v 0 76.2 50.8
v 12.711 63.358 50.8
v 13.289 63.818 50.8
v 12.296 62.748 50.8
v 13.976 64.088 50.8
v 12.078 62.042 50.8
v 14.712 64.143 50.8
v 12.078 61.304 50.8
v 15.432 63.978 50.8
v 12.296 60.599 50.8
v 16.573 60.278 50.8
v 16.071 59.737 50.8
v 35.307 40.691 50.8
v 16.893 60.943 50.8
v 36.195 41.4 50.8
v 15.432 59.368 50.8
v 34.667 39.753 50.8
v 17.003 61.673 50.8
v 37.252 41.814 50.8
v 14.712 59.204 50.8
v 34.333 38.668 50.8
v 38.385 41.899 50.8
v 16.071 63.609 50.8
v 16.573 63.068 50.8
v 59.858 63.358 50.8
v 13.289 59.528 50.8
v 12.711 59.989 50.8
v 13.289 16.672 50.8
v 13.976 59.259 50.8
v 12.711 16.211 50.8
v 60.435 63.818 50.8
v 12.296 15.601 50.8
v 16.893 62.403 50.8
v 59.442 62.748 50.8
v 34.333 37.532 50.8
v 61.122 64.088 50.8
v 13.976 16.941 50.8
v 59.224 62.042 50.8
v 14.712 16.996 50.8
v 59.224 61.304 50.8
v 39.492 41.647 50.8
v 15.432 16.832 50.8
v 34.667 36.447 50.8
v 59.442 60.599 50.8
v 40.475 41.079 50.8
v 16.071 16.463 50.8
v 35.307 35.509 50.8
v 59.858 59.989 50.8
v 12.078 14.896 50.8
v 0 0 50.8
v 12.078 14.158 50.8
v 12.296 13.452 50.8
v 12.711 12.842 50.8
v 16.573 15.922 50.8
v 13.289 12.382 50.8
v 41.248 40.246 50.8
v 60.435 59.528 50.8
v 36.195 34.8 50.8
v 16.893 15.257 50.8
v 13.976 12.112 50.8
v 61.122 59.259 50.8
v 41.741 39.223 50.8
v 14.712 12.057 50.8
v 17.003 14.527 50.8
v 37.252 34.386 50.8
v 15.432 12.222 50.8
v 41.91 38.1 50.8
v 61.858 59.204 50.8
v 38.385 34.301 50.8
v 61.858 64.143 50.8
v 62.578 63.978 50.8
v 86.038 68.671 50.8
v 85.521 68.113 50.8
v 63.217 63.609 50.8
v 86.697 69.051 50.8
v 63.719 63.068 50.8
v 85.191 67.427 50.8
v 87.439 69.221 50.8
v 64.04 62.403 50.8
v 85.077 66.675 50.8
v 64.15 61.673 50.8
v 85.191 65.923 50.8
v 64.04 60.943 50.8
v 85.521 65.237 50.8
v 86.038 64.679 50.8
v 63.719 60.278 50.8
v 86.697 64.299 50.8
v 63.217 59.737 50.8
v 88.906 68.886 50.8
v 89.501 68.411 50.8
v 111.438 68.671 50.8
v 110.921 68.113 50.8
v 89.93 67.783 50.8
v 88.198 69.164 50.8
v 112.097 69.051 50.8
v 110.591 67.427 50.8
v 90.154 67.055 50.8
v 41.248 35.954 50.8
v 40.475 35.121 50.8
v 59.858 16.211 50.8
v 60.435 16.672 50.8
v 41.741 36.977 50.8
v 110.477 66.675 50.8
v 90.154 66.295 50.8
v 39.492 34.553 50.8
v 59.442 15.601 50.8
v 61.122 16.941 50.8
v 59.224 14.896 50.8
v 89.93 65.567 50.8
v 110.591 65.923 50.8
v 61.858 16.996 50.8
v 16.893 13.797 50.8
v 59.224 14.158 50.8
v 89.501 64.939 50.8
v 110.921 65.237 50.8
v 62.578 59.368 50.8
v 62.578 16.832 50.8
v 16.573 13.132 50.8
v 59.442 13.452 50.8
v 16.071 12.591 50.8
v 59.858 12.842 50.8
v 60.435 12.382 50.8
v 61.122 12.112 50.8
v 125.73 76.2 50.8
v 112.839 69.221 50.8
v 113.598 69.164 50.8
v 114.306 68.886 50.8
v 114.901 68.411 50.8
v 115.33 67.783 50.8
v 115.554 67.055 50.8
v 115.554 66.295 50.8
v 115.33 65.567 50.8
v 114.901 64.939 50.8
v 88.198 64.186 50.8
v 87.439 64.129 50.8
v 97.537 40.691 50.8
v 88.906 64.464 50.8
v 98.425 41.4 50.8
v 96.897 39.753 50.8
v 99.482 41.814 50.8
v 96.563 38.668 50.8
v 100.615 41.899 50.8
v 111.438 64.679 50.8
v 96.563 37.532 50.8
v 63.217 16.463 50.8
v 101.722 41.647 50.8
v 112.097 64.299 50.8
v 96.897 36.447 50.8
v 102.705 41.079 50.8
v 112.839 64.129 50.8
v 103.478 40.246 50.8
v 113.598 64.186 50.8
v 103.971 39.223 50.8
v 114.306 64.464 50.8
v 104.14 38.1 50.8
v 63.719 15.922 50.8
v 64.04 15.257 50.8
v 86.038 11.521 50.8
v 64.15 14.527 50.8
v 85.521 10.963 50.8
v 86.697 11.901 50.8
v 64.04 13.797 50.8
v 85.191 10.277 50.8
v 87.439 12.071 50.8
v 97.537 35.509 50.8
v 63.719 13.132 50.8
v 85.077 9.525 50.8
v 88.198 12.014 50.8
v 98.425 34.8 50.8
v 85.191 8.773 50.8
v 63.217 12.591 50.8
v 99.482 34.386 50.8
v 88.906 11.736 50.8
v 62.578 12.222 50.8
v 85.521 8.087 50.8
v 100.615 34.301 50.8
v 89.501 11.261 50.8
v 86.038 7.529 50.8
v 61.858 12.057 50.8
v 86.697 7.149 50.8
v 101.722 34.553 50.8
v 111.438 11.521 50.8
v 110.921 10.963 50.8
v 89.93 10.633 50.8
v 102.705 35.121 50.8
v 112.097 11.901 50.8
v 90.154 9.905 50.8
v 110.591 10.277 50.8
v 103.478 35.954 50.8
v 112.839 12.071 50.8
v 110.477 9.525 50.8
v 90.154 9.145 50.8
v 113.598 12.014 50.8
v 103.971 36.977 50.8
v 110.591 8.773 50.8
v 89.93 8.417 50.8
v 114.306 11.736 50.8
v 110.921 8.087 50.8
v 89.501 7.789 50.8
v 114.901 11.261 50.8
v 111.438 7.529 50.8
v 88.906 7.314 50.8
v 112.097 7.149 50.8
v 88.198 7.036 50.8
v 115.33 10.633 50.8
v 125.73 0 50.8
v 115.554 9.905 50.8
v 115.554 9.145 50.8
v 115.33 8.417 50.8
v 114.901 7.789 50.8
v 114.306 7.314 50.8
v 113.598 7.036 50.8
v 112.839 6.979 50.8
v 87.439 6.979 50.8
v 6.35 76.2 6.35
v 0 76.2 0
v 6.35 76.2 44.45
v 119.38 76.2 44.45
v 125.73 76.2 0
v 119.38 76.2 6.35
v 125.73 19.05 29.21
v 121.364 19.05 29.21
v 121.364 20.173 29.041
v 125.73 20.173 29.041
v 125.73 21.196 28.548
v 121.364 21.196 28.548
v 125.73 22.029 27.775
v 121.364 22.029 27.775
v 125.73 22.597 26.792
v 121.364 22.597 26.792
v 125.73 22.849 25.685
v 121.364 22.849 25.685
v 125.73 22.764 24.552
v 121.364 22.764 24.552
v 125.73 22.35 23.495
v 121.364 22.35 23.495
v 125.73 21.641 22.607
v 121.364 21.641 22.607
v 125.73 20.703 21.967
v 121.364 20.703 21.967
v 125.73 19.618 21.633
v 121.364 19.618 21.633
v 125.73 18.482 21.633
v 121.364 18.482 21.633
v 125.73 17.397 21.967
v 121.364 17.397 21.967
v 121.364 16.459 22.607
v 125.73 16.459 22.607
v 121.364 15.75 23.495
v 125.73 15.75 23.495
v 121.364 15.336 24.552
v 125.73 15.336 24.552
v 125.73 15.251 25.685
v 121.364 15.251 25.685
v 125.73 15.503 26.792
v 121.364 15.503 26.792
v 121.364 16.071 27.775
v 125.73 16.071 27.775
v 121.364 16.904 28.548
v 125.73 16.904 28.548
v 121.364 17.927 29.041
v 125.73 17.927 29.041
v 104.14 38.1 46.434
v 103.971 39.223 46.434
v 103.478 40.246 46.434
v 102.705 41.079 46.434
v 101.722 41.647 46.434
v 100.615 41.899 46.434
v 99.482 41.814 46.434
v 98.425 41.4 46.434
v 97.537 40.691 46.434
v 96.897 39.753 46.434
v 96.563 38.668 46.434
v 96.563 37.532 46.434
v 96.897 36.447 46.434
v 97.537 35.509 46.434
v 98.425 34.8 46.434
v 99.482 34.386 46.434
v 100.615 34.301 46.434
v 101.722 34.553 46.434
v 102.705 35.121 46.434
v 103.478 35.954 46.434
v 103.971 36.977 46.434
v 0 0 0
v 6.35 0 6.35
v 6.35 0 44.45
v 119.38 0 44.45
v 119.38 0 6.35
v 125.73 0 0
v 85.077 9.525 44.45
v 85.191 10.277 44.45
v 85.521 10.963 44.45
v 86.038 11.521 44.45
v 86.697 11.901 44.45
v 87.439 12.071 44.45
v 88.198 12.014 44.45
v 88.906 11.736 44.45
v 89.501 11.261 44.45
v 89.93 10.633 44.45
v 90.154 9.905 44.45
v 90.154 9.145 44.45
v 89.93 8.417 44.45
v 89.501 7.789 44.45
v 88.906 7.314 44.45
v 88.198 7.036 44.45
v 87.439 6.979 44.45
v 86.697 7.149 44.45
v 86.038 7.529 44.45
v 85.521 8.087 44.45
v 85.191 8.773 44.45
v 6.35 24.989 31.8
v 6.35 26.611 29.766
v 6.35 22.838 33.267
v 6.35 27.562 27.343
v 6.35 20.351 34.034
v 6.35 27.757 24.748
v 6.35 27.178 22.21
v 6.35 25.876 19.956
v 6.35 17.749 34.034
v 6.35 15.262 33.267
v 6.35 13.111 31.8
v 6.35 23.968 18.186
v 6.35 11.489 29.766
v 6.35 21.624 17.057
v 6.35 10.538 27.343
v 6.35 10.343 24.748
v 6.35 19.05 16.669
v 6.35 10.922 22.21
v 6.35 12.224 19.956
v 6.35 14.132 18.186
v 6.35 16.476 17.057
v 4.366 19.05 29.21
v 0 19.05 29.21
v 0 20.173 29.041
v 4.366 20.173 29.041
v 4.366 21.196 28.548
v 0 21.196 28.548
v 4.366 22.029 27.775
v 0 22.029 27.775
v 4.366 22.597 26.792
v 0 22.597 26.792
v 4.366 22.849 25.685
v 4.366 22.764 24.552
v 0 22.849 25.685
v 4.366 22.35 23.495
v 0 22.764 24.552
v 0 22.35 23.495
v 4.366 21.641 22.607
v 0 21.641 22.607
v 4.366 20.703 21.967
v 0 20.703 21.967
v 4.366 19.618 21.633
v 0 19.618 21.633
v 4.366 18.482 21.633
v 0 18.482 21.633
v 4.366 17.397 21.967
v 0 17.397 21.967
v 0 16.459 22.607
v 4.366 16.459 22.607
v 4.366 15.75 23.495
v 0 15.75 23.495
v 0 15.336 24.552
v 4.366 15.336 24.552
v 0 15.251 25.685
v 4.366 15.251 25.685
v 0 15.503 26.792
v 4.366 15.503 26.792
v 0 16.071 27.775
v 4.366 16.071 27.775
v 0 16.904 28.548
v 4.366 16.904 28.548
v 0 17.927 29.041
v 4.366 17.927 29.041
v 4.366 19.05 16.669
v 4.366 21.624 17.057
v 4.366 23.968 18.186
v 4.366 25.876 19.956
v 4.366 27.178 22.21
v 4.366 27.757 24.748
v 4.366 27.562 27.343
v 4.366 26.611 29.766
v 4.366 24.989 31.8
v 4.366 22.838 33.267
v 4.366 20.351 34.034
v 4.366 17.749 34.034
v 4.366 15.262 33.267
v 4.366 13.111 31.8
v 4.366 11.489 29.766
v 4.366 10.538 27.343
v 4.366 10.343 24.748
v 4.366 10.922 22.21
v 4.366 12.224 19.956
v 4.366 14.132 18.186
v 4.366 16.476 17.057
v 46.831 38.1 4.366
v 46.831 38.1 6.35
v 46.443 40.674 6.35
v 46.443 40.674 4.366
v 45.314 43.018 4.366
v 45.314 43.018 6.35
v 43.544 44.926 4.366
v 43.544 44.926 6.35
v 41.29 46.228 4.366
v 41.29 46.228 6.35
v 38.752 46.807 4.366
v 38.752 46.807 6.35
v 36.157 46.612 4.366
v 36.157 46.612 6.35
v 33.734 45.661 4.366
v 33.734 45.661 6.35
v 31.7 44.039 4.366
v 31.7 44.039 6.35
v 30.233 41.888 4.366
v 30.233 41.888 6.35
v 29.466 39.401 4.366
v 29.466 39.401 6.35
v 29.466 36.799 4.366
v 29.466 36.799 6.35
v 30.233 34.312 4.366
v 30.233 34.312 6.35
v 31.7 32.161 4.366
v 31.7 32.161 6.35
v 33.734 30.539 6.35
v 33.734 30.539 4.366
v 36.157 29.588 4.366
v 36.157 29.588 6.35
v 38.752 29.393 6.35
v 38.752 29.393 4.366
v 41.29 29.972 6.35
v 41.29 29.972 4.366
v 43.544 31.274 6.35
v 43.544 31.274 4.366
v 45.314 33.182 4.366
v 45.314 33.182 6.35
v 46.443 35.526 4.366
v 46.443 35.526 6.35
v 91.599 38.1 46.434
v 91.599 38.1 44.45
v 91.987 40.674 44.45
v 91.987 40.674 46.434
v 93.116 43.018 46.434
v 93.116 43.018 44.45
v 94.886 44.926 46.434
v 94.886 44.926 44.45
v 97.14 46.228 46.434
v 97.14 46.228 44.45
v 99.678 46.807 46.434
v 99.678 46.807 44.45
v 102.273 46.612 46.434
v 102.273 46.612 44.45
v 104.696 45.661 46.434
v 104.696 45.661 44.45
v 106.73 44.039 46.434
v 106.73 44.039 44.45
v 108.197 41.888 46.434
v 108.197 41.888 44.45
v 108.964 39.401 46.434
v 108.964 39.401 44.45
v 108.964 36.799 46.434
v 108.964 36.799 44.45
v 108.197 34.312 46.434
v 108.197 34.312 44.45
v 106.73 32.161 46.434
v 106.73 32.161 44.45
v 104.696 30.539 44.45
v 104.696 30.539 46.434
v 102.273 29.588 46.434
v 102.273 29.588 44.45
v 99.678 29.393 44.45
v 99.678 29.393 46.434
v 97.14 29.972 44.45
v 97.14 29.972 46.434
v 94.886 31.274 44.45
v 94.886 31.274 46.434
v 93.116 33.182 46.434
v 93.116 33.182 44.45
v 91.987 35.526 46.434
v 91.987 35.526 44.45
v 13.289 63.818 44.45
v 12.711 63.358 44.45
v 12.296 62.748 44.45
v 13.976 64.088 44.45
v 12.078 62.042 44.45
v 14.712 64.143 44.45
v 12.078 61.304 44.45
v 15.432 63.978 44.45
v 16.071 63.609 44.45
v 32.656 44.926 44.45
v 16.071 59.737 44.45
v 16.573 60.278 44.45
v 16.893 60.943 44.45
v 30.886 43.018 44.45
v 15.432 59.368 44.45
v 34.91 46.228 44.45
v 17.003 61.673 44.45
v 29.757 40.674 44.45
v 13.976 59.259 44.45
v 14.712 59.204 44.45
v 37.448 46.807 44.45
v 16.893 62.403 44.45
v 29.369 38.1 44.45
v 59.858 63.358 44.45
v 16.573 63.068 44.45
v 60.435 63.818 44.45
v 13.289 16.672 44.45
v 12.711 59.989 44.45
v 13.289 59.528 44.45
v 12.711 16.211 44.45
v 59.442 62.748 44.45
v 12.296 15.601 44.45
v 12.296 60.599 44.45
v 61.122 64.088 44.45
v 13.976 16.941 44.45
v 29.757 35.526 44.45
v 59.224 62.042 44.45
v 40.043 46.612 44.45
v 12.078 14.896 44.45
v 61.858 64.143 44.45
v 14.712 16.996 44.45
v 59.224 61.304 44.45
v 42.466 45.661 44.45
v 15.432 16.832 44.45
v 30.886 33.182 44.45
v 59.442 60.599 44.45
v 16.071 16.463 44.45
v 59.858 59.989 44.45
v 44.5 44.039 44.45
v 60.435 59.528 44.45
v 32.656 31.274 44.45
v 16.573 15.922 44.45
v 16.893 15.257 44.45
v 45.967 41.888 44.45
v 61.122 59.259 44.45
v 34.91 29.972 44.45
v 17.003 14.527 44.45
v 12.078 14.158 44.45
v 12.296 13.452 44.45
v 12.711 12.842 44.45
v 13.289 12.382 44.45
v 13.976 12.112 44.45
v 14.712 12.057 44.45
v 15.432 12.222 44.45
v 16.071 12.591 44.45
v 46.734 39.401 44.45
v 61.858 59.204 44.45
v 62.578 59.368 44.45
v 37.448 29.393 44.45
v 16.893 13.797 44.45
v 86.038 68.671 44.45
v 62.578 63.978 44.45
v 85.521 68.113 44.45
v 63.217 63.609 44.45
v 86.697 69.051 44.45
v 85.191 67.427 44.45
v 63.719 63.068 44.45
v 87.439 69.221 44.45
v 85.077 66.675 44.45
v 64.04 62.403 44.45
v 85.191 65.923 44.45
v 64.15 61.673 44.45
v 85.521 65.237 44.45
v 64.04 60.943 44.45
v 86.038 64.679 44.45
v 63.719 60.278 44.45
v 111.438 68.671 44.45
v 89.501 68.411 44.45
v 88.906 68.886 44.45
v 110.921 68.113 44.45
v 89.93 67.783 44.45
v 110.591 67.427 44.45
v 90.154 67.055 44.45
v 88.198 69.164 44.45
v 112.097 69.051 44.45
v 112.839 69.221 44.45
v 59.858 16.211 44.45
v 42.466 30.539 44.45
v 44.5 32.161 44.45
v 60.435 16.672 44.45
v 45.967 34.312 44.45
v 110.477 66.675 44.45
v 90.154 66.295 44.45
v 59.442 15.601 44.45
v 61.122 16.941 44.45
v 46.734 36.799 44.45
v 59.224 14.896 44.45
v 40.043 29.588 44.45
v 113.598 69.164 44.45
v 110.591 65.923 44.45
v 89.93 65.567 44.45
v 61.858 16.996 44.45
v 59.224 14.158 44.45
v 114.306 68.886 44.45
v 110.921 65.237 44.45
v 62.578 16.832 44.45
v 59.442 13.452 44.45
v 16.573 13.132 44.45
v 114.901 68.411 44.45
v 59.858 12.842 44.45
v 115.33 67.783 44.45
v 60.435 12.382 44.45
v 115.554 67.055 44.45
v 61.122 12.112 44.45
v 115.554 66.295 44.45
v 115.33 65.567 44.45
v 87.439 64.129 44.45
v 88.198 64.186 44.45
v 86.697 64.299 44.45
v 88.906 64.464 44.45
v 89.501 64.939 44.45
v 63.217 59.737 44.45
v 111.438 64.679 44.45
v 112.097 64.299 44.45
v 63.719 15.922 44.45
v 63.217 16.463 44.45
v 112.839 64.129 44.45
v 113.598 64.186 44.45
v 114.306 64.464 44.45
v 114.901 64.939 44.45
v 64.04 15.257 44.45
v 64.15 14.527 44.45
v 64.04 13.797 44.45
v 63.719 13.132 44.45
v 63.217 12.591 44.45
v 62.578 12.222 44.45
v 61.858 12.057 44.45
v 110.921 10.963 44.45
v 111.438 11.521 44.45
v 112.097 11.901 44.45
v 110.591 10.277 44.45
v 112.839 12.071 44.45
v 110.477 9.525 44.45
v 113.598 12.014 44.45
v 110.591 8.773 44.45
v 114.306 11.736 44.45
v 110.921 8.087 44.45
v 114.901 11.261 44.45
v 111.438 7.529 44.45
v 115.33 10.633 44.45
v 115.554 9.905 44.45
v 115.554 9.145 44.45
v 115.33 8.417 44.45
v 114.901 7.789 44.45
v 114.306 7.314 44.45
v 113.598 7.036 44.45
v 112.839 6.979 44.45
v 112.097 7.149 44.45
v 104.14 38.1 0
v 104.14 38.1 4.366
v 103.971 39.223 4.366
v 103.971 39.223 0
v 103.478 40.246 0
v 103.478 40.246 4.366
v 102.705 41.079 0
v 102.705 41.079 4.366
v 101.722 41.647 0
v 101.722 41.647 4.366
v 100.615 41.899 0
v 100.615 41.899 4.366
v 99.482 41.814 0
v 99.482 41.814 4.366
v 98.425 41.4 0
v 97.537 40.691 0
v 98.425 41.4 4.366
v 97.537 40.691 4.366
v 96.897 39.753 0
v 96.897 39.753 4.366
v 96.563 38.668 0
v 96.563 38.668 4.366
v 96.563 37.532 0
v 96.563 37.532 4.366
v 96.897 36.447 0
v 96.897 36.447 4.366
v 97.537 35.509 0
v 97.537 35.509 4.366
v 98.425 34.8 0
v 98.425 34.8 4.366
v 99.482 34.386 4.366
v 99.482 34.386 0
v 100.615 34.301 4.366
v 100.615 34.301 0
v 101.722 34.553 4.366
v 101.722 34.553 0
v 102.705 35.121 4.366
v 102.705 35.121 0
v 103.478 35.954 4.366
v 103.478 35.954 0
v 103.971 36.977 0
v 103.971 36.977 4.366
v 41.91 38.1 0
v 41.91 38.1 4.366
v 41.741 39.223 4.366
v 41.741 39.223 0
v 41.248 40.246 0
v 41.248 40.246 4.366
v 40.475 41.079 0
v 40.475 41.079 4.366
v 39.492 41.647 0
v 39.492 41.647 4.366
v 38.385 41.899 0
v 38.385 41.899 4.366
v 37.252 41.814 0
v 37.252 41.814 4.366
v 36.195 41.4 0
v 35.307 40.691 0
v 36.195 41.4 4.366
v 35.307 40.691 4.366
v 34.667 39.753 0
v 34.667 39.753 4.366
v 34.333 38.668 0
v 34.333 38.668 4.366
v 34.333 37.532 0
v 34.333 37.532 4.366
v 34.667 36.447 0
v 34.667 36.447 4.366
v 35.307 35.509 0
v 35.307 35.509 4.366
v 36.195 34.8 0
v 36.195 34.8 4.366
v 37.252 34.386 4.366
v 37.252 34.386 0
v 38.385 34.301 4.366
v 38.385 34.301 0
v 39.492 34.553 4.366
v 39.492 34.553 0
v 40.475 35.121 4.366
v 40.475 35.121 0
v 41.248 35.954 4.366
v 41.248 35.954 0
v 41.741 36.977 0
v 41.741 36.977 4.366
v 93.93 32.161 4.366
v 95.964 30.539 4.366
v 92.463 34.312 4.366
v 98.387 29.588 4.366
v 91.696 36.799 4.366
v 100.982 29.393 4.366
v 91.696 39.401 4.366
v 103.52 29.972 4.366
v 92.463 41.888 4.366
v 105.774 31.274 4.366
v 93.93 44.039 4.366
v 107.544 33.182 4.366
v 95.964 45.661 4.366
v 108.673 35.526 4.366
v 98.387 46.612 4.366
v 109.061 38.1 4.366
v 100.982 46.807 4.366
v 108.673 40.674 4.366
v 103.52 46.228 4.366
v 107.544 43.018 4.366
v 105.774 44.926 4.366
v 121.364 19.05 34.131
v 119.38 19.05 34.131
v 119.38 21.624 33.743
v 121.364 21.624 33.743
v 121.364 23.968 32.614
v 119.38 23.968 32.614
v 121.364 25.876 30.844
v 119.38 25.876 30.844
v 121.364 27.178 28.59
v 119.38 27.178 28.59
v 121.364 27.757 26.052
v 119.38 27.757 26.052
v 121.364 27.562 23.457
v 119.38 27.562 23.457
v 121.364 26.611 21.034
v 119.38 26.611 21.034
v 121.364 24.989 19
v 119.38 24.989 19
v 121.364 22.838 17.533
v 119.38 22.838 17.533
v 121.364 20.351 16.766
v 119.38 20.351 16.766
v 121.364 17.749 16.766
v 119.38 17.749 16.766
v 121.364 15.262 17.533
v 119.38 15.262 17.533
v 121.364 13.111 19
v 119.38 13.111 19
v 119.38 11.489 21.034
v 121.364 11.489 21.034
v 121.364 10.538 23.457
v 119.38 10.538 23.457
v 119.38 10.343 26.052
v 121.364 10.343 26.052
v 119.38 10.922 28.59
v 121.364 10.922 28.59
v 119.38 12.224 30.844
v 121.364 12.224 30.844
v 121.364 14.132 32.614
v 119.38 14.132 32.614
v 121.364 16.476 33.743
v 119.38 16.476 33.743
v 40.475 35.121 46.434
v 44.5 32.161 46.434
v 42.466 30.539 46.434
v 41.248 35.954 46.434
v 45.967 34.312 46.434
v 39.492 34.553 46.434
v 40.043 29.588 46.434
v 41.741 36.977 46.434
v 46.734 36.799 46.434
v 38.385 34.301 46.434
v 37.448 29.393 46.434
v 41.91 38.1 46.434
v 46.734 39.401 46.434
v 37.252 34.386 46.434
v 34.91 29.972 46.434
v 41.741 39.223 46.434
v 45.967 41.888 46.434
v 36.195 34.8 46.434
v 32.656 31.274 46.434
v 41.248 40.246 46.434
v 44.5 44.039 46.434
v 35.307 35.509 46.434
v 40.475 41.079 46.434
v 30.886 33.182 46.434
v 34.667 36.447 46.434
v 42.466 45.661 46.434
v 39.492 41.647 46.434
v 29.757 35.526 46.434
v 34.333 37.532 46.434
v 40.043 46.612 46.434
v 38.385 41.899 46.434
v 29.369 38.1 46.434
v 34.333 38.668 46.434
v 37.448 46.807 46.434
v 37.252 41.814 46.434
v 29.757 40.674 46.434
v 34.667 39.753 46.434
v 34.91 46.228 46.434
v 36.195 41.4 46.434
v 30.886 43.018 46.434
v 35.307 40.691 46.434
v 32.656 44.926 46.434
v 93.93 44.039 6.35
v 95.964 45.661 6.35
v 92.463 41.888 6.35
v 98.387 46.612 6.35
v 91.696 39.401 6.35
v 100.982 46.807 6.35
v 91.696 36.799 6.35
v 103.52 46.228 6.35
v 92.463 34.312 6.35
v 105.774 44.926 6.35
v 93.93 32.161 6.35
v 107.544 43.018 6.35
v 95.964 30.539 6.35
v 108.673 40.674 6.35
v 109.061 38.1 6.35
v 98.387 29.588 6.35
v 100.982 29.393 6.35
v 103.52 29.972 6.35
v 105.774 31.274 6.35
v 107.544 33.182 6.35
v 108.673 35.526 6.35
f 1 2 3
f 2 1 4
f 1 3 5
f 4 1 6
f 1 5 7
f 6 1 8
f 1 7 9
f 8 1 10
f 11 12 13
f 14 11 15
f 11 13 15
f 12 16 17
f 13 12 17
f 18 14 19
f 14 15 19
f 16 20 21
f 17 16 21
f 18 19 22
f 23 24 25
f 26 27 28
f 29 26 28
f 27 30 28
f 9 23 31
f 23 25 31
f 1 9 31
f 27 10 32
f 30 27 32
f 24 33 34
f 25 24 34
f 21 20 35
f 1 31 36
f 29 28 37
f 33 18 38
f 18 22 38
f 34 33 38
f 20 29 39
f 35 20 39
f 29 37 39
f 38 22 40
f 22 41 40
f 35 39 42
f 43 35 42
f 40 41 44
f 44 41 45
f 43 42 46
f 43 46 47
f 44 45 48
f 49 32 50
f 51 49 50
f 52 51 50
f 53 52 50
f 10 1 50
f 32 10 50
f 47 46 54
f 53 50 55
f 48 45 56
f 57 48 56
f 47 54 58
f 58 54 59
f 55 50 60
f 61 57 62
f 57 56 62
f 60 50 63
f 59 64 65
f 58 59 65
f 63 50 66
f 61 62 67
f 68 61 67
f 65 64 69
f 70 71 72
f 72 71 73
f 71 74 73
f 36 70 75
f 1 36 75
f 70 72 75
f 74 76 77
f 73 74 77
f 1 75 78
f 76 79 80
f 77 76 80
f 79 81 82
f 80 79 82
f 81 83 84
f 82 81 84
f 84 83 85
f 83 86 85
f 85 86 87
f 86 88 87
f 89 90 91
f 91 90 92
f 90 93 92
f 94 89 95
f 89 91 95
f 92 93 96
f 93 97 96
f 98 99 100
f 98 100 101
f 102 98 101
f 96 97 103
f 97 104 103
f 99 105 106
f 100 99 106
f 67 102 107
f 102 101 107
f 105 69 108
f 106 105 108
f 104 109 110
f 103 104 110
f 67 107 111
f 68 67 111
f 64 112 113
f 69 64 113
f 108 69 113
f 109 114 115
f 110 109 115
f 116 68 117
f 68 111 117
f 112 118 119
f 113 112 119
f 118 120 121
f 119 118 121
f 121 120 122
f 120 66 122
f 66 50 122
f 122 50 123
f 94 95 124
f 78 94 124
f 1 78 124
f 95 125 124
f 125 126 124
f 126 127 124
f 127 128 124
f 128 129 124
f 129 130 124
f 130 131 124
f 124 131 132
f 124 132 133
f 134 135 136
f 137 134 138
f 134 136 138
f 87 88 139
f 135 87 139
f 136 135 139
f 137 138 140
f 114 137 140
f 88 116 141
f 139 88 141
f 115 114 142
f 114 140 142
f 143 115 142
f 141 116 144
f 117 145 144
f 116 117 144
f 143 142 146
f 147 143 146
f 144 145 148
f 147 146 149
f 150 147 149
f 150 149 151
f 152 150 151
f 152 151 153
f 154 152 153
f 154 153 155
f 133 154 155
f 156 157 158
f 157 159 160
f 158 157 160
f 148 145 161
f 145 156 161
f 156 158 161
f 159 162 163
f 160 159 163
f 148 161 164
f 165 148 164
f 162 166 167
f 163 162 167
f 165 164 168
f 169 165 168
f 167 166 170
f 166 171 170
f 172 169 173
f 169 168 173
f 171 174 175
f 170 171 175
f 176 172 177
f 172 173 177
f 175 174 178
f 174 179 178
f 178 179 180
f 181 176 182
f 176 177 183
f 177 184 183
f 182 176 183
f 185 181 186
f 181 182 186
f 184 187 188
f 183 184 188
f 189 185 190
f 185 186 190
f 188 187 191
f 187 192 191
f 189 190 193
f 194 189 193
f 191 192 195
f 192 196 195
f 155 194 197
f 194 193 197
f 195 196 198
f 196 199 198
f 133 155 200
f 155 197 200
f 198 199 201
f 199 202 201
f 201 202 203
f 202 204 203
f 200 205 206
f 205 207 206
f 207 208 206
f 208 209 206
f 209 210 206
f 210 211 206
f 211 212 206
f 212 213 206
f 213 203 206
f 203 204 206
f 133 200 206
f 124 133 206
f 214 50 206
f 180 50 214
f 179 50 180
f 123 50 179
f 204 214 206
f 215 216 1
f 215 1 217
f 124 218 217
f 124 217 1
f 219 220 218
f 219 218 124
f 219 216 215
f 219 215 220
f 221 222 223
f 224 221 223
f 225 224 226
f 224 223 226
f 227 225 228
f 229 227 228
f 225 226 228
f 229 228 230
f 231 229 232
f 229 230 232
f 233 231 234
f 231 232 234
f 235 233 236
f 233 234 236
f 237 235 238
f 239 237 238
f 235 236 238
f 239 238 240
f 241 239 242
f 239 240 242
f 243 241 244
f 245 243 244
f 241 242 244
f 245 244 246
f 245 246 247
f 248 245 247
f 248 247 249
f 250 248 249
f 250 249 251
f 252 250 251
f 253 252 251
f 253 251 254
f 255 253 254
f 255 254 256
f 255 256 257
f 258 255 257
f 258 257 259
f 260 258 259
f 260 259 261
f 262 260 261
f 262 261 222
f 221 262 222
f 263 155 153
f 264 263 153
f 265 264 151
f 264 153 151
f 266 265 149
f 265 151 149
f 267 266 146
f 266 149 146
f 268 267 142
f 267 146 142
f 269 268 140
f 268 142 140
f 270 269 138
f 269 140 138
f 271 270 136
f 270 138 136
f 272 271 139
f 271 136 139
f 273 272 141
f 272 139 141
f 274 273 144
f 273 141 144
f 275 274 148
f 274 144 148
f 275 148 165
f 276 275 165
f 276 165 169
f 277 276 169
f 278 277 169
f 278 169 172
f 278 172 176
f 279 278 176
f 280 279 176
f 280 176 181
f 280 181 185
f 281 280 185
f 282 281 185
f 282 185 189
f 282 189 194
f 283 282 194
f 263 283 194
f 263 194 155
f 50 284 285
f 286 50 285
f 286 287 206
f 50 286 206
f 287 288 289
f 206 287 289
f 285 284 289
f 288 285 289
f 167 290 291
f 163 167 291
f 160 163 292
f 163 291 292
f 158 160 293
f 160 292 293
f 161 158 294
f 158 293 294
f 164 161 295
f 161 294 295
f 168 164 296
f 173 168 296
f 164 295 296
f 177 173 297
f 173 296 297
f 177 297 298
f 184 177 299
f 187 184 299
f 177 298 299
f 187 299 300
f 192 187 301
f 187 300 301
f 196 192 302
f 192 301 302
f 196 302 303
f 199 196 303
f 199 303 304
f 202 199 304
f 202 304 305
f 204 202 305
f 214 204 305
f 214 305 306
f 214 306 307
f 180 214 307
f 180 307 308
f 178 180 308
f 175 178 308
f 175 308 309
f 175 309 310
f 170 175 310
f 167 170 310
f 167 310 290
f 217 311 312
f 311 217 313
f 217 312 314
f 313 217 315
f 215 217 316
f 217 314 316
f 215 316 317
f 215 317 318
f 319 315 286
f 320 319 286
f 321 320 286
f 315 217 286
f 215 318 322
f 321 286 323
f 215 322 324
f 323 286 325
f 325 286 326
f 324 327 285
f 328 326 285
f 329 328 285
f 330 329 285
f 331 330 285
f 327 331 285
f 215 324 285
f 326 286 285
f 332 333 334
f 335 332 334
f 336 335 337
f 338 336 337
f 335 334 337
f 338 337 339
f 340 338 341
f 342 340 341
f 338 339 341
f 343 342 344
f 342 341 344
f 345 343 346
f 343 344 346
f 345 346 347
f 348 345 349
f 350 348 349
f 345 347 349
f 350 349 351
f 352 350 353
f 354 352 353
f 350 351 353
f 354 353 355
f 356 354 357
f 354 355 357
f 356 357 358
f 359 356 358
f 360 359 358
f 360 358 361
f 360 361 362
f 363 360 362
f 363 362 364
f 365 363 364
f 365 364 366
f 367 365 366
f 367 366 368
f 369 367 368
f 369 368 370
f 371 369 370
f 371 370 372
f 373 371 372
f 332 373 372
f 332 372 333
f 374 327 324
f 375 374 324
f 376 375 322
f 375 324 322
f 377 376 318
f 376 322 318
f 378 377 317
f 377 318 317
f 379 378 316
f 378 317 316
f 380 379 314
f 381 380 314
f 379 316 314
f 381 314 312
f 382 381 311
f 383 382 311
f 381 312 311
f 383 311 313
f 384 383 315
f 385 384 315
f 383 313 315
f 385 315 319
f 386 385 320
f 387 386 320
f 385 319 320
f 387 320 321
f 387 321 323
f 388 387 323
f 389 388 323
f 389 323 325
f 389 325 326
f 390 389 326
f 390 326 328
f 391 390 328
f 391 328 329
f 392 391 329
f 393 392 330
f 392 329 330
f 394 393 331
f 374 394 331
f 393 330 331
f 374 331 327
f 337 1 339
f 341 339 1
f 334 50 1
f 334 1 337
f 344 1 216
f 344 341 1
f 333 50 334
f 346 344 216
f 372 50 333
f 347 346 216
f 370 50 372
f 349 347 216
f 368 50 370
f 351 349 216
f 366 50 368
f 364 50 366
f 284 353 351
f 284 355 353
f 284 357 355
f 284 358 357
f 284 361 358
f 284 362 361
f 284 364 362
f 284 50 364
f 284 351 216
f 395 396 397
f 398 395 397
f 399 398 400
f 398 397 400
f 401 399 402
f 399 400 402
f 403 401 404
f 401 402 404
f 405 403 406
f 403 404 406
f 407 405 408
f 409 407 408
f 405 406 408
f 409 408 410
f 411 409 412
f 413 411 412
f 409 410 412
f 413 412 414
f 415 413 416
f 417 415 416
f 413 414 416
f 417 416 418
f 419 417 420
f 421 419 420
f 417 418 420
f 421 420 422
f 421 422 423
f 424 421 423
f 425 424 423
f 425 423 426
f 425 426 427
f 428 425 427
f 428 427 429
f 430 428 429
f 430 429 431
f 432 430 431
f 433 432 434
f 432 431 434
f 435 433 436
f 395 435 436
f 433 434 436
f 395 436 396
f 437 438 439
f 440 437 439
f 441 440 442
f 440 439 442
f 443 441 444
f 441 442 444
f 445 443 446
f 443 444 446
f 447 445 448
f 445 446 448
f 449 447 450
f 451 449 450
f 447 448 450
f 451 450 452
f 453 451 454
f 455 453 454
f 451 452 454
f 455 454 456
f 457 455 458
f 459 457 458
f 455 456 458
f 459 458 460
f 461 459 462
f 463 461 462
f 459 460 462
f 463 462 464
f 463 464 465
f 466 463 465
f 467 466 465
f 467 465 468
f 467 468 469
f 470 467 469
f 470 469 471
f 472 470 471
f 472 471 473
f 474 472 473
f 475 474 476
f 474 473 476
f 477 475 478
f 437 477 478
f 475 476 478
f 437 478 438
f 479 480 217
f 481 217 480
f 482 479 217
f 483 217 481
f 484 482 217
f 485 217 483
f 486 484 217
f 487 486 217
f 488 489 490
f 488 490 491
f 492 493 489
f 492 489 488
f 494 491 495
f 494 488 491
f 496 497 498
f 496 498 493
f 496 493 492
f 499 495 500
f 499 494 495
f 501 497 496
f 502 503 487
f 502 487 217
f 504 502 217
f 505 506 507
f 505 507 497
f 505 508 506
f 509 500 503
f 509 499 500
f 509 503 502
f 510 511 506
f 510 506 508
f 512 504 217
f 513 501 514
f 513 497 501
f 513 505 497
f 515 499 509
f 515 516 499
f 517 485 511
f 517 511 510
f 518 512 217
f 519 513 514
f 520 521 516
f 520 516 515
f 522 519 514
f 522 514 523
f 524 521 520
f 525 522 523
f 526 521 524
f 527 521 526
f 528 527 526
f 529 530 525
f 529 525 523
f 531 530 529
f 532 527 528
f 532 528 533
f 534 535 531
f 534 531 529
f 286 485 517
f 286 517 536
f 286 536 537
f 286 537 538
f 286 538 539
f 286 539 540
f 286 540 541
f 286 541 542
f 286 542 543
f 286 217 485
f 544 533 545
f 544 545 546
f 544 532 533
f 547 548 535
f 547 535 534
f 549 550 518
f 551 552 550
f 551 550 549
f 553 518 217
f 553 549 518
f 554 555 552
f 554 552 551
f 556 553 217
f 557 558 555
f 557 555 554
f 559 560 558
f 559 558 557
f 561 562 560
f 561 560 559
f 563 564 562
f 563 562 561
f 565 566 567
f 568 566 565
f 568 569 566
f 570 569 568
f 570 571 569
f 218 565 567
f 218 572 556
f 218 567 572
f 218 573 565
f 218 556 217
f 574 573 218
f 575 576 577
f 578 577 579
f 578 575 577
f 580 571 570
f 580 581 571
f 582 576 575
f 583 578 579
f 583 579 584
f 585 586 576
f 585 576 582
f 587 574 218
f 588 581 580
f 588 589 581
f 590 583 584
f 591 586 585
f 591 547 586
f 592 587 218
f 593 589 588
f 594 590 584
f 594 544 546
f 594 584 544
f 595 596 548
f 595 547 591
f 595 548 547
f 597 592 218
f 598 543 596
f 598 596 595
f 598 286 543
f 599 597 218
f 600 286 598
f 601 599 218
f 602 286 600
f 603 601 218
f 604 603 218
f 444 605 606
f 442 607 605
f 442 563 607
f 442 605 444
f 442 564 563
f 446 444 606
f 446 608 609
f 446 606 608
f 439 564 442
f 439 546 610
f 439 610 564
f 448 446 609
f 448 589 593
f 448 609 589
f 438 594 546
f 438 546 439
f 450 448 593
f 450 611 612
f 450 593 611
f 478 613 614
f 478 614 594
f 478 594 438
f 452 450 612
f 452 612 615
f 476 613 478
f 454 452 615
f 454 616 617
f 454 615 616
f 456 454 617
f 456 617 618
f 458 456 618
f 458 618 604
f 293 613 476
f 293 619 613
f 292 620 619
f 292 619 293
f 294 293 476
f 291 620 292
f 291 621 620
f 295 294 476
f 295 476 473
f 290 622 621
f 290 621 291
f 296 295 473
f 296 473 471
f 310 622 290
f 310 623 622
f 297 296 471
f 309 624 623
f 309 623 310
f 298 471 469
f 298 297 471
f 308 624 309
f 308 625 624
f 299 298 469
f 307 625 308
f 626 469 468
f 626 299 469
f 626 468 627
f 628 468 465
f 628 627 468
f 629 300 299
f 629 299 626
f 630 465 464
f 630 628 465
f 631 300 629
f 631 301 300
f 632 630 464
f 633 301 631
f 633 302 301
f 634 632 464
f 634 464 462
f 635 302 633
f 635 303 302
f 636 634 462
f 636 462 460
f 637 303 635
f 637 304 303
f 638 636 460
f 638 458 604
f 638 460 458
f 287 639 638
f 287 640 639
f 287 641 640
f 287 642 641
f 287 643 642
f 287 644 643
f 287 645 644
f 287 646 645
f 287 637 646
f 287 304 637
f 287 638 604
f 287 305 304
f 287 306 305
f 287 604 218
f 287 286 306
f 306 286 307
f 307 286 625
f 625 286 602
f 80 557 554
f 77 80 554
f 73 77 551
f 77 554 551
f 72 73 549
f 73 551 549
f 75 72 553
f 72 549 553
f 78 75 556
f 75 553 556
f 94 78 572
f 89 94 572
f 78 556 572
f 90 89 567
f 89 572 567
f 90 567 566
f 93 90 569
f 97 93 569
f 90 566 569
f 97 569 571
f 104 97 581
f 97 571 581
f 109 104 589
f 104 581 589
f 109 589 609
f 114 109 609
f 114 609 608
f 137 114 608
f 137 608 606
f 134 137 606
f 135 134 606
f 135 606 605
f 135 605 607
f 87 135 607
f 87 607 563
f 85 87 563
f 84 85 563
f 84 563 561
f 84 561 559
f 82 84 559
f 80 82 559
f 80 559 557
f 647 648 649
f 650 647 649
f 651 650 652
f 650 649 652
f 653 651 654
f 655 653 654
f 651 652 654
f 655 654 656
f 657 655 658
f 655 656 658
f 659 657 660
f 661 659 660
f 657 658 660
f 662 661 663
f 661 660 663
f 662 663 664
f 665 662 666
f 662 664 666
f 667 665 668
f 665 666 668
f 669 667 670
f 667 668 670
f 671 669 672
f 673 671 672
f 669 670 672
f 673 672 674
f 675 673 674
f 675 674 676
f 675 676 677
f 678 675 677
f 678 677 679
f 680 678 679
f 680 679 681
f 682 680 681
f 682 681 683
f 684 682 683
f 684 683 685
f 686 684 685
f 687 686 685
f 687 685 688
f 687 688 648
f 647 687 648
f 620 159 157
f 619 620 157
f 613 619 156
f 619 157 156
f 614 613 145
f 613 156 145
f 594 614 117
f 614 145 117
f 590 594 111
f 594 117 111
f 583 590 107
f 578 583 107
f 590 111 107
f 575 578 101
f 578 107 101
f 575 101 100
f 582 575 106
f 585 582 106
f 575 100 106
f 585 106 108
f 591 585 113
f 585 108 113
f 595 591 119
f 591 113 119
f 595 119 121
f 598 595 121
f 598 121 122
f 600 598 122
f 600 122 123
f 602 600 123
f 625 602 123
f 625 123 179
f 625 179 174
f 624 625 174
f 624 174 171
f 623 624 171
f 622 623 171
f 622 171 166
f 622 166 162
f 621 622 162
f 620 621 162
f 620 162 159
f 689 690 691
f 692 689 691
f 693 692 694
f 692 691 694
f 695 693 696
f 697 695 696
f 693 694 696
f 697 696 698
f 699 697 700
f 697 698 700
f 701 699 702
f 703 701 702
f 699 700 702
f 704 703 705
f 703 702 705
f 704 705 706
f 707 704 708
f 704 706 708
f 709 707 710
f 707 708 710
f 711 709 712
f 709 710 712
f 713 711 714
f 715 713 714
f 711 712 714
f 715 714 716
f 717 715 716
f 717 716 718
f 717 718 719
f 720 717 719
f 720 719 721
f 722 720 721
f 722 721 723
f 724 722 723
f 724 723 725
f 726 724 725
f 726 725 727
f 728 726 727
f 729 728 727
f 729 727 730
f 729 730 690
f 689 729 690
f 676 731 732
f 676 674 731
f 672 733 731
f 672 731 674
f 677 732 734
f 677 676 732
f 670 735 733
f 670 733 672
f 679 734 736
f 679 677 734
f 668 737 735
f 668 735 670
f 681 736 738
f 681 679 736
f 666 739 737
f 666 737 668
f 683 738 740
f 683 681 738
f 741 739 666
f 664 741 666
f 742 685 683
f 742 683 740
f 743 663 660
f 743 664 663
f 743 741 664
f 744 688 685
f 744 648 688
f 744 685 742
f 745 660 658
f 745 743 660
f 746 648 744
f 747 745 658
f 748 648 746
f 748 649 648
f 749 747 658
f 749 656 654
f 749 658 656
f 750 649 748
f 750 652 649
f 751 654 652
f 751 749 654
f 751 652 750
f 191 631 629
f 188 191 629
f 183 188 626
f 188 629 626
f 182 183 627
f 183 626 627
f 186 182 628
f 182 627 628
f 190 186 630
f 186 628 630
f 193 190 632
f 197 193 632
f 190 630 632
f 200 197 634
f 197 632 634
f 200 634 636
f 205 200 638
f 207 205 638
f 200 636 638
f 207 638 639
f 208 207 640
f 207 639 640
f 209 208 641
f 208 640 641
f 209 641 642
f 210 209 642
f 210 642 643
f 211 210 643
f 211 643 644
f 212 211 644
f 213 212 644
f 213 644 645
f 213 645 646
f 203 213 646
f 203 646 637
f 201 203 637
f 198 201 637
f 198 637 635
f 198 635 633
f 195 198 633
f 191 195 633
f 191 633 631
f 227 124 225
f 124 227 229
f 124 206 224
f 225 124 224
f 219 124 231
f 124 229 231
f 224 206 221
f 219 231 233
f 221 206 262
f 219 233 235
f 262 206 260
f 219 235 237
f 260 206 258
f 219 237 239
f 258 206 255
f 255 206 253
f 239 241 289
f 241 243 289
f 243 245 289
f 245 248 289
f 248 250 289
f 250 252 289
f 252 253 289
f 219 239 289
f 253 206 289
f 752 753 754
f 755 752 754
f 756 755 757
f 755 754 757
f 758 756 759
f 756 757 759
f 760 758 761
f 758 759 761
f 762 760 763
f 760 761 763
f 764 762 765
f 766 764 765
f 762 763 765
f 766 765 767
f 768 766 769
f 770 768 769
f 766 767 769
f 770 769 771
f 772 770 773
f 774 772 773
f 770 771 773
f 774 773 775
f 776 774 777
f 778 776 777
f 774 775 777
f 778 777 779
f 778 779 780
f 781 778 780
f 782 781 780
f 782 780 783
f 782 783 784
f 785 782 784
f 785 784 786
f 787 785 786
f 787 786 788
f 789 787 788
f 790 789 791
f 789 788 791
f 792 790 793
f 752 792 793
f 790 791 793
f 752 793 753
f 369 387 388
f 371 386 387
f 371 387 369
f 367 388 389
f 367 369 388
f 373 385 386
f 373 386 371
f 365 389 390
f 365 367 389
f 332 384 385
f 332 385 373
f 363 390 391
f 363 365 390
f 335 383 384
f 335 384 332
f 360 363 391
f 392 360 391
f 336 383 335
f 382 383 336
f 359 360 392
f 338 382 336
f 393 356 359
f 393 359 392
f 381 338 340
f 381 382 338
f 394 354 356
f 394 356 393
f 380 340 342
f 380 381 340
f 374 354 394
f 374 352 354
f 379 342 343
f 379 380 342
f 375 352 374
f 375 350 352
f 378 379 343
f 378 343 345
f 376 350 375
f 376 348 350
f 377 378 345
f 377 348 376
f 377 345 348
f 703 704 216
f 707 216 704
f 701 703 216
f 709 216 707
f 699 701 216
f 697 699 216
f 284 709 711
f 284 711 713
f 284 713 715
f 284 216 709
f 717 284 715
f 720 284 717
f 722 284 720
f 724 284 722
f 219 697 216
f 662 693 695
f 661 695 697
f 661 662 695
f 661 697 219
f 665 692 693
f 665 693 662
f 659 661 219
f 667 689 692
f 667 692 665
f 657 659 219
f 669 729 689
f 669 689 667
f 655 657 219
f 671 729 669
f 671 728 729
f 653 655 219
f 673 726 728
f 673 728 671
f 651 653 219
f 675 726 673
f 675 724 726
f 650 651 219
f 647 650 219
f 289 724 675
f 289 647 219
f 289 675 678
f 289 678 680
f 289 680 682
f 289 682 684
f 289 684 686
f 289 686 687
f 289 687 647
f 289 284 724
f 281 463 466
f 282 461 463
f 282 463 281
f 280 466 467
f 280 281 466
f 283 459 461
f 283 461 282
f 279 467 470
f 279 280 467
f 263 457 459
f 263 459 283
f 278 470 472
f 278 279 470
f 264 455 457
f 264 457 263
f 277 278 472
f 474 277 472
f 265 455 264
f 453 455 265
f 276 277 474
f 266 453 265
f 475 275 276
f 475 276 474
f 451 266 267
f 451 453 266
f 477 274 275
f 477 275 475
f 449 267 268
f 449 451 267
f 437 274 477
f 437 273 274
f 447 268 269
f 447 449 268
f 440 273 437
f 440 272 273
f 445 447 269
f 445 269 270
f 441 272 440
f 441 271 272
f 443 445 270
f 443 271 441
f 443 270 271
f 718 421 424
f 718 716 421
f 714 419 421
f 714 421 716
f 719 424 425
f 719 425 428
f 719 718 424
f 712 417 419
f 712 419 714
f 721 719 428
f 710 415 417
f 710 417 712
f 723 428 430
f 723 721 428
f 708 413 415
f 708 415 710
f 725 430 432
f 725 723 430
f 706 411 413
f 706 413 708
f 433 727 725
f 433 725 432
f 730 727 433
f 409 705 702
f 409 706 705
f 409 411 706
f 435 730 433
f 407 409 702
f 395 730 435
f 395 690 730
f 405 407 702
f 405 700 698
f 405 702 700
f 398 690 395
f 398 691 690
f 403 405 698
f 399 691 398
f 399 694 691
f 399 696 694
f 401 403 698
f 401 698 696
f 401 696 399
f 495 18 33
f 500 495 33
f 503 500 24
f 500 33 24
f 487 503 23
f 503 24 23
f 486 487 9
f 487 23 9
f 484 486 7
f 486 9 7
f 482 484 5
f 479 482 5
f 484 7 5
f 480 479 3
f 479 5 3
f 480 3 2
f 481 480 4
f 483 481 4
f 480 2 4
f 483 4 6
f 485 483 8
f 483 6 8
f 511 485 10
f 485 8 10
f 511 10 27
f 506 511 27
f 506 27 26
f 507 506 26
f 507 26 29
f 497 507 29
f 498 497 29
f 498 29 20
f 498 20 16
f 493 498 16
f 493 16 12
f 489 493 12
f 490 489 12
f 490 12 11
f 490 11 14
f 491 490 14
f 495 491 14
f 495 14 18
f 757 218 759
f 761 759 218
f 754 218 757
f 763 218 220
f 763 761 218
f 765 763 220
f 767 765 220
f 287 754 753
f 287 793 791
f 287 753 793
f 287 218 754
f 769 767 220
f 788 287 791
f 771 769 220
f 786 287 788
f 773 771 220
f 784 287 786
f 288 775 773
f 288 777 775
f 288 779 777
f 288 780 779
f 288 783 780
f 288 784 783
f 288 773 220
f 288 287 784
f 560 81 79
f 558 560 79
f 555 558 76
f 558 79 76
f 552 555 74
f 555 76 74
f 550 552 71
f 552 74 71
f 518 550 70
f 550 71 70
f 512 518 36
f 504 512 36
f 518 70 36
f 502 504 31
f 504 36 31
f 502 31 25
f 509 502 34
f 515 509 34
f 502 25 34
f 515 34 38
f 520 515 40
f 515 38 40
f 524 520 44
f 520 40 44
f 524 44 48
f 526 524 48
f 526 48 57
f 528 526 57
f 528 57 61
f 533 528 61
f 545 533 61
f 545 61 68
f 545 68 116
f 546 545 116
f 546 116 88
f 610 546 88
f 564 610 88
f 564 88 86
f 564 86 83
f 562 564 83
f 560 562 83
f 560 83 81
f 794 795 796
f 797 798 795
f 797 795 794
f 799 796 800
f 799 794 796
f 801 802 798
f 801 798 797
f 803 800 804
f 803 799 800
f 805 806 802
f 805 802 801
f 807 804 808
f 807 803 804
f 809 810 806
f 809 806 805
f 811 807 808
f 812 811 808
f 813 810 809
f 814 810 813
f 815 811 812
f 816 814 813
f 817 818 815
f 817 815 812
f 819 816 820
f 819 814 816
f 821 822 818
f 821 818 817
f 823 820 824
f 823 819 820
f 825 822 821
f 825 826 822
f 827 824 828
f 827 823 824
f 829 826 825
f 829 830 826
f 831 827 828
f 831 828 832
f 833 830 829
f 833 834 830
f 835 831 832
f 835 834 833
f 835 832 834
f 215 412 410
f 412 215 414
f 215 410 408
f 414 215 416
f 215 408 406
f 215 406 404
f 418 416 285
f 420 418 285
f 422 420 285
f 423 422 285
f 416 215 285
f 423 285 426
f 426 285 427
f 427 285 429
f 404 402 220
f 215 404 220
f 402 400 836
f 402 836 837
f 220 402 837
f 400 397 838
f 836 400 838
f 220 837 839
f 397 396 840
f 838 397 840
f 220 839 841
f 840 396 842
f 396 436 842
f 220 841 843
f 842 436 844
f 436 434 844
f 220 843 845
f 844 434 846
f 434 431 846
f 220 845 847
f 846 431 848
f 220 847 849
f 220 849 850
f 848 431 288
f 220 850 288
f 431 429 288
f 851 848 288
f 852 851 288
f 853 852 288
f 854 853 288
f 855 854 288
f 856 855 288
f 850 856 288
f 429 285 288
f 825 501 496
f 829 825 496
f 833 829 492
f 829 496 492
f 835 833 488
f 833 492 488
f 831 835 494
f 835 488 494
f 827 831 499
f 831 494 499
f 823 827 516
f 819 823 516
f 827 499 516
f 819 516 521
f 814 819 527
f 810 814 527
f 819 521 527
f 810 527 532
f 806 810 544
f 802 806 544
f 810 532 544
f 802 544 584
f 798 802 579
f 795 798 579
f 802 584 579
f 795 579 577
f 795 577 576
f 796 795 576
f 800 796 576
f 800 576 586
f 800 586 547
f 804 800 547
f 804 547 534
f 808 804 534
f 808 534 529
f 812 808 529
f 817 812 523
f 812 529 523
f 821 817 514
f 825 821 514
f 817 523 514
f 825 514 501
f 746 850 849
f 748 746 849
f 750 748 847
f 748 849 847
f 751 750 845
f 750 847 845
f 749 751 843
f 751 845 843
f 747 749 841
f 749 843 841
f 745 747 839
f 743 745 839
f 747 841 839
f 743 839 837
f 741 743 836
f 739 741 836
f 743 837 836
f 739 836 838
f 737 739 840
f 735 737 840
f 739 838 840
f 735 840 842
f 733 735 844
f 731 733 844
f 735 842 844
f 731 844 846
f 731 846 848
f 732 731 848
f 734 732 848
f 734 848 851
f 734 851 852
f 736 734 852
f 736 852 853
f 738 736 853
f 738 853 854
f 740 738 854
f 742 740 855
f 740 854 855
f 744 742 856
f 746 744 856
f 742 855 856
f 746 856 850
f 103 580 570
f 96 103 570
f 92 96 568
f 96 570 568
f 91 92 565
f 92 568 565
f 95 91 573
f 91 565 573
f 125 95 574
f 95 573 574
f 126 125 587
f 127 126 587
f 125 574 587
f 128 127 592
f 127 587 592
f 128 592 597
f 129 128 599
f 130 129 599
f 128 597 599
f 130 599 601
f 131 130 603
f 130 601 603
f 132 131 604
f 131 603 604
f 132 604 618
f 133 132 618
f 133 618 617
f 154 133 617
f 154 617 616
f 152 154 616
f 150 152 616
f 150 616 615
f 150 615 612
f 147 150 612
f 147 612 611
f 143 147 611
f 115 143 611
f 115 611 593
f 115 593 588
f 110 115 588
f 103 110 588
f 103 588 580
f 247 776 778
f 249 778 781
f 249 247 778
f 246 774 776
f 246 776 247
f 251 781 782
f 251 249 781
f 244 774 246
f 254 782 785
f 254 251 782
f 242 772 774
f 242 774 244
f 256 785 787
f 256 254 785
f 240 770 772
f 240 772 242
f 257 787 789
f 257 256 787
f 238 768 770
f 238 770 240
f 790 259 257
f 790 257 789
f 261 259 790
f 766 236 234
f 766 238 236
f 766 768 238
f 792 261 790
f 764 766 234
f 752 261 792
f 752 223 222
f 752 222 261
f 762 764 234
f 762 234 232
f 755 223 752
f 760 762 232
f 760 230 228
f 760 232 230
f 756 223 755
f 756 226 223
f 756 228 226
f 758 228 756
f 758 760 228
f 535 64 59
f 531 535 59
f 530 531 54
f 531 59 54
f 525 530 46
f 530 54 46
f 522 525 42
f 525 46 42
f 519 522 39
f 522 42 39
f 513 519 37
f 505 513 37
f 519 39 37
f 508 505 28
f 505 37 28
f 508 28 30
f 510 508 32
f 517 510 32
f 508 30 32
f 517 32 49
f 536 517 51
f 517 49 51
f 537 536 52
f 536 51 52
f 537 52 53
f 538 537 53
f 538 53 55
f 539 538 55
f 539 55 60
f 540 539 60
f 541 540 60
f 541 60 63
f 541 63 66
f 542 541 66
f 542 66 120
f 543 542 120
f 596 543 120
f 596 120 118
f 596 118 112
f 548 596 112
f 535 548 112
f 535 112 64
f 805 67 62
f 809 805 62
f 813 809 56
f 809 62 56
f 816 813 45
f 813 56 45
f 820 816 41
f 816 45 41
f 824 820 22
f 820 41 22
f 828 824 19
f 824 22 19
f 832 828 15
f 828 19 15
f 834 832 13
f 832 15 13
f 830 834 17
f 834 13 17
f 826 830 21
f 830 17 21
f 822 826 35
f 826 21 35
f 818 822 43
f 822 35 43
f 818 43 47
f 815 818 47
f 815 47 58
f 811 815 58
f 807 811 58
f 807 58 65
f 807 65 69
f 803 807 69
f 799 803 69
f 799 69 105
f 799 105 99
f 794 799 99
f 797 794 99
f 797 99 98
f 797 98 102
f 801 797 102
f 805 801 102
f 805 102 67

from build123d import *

# Parameters (mm, degrees)
SKETCH1_W           = 125.73
SKETCH1_H           = 50.8
SKETCH1_W_2         = 113.03
SKETCH1_H_2         = 38.1
BOSS_EXTRUDE1_DEPTH = 76.2
CUT_EXTRUDE1_REACH  = 157.548
SKETCH2_R           = 2.4765
SKETCH2_5_R         = 3.81
CUT_EXTRUDE2_DEPTH  = 156.547783334
SKETCH5_R           = 3.81
CUT_EXTRUDE4_DEPTH  = 156.547783334
SKETCH6_R           = 3.81
CUT_EXTRUDE5_DEPTH  = 156.547783334
SKETCH7_R           = 8.73125
CUT_EXTRUDE6_DEPTH  = 1.984375
SKETCH8_R           = 8.73125
CUT_EXTRUDE7_DEPTH  = 1.984375
CUT_EXTRUDE8_START  = -1.984375
SKETCH9_R           = 8.73125
CUT_EXTRUDE8_DEPTH  = 1.984375
CUT_EXTRUDE9_START  = -1.984375
SKETCH10_R          = 8.73125
CUT_EXTRUDE9_DEPTH  = 1.984375
SKETCH12_R          = 2.5527
CUT_EXTRUDE11_DEPTH = 154.591260819


with BuildPart() as part:
    # Sketch1 → Boss-Extrude1 (new body)
    with BuildSketch(Plane(origin=(0, 0, 0), x_dir=(1, 0, 0), z_dir=(0, 1, 0))):
        with Locations((62.865, -25.4)):
            Rectangle(SKETCH1_W, SKETCH1_H)
        with Locations((62.865, -25.4)):
            Rectangle(SKETCH1_W_2, SKETCH1_H_2, mode=Mode.SUBTRACT)
    extrude(amount=BOSS_EXTRUDE1_DEPTH)

    # Sketch2 → Cut-Extrude1 (cut, up to next)
    with BuildSketch(Plane.XY.offset(50.8), mode=Mode.PRIVATE) as cut_extrude1_sk1:
        with Locations((14.526827682, 61.673172318)):
            Circle(SKETCH2_R)
    cut_extrude1_tool1 = extrude(cut_extrude1_sk1.sketch, amount=-CUT_EXTRUDE1_REACH, mode=Mode.PRIVATE) & part.part
    # Sketch2 → Cut-Extrude1 (cut, up to next)
    with BuildSketch(Plane.XY.offset(50.8), mode=Mode.PRIVATE) as cut_extrude1_sk2:
        with Locations((61.673172318, 61.673172318)):
            Circle(SKETCH2_R)
    cut_extrude1_tool2 = extrude(cut_extrude1_sk2.sketch, amount=-CUT_EXTRUDE1_REACH, mode=Mode.PRIVATE) & part.part
    # Sketch2 → Cut-Extrude1 (cut, up to next)
    with BuildSketch(Plane.XY.offset(50.8), mode=Mode.PRIVATE) as cut_extrude1_sk3:
        with Locations((61.673172318, 14.526827682)):
            Circle(SKETCH2_R)
    cut_extrude1_tool3 = extrude(cut_extrude1_sk3.sketch, amount=-CUT_EXTRUDE1_REACH, mode=Mode.PRIVATE) & part.part
    # Sketch2 → Cut-Extrude1 (cut, up to next)
    with BuildSketch(Plane.XY.offset(50.8), mode=Mode.PRIVATE) as cut_extrude1_sk4:
        with Locations((14.526827682, 14.526827682)):
            Circle(SKETCH2_R)
    cut_extrude1_tool4 = extrude(cut_extrude1_sk4.sketch, amount=-CUT_EXTRUDE1_REACH, mode=Mode.PRIVATE) & part.part
    add(cut_extrude1_tool1.solids().sort_by_distance((14.526828, 61.673172, 50.8))[0], mode=Mode.SUBTRACT)
    add(cut_extrude1_tool2.solids().sort_by_distance((61.673172, 61.673172, 50.8))[0], mode=Mode.SUBTRACT)
    add(cut_extrude1_tool3.solids().sort_by_distance((61.673172, 14.526828, 50.8))[0], mode=Mode.SUBTRACT)
    add(cut_extrude1_tool4.solids().sort_by_distance((14.526828, 14.526828, 50.8))[0], mode=Mode.SUBTRACT)

    # Sketch2<5> → Cut-Extrude2 (cut, through all)
    with BuildSketch(Plane.XY.offset(50.8)):
        with Locations((38.1, 38.1)):
            Circle(SKETCH2_5_R)
    extrude(amount=-CUT_EXTRUDE2_DEPTH, mode=Mode.SUBTRACT)

    # Sketch5 → Cut-Extrude4 (cut, through all)
    with BuildSketch(Plane.XY.offset(50.8)):
        with Locations((100.33, 38.1)):
            Circle(SKETCH5_R)
    extrude(amount=-CUT_EXTRUDE4_DEPTH, mode=Mode.SUBTRACT)

    # Sketch6 → Cut-Extrude5 (cut, through all)
    with BuildSketch(Plane.ZY):
        with Locations((25.4, 19.05)):
            Circle(SKETCH6_R)
    extrude(amount=-CUT_EXTRUDE5_DEPTH, mode=Mode.SUBTRACT)

    # Sketch7 → Cut-Extrude6 (cut)
    with BuildSketch(Plane(origin=(6.35, 0, 0), x_dir=(0, 0, -1), z_dir=(1, 0, 0))):
        with Locations((-25.4, 19.05)):
            Circle(SKETCH7_R)
    extrude(amount=-CUT_EXTRUDE6_DEPTH, mode=Mode.SUBTRACT)

    # Sketch8 → Cut-Extrude7 (cut)
    with BuildSketch(Plane(origin=(0, 0, 44.45), x_dir=(-1, 0, 0), z_dir=(0, 0, -1))):
        with Locations((-38.1, 38.1)):
            Circle(SKETCH8_R)
        with Locations((-100.33, 38.1)):
            Circle(SKETCH8_R)
    extrude(amount=-CUT_EXTRUDE7_DEPTH, mode=Mode.SUBTRACT)

    # Sketch9 → Cut-Extrude8 (cut)
    with BuildSketch(Plane.ZY.offset(-119.38).offset(CUT_EXTRUDE8_START)):
        with Locations((25.4, 19.05)):
            Circle(SKETCH9_R)
    extrude(amount=CUT_EXTRUDE8_DEPTH, mode=Mode.SUBTRACT)

    # Sketch10 → Cut-Extrude9 (cut)
    with BuildSketch(Plane.XY.offset(6.35).offset(CUT_EXTRUDE9_START)):
        with Locations((38.1, 38.1)):
            Circle(SKETCH10_R)
        with Locations((100.33, 38.1)):
            Circle(SKETCH10_R)
    extrude(amount=CUT_EXTRUDE9_DEPTH, mode=Mode.SUBTRACT)

    # Sketch12 → Cut-Extrude11 (cut, through all)
    with BuildSketch(Plane(origin=(0, 0, 44.45), x_dir=(-1, 0, 0), z_dir=(0, 0, -1))):
        with Locations((-87.63, 9.525)):
            Circle(SKETCH12_R)
        with Locations((-113.03, 9.525)):
            Circle(SKETCH12_R)
        with Locations((-113.03, 66.675)):
            Circle(SKETCH12_R)
        with Locations((-87.63, 66.675)):
            Circle(SKETCH12_R)
    extrude(amount=-CUT_EXTRUDE11_DEPTH, mode=Mode.SUBTRACT)


solid = part.part
